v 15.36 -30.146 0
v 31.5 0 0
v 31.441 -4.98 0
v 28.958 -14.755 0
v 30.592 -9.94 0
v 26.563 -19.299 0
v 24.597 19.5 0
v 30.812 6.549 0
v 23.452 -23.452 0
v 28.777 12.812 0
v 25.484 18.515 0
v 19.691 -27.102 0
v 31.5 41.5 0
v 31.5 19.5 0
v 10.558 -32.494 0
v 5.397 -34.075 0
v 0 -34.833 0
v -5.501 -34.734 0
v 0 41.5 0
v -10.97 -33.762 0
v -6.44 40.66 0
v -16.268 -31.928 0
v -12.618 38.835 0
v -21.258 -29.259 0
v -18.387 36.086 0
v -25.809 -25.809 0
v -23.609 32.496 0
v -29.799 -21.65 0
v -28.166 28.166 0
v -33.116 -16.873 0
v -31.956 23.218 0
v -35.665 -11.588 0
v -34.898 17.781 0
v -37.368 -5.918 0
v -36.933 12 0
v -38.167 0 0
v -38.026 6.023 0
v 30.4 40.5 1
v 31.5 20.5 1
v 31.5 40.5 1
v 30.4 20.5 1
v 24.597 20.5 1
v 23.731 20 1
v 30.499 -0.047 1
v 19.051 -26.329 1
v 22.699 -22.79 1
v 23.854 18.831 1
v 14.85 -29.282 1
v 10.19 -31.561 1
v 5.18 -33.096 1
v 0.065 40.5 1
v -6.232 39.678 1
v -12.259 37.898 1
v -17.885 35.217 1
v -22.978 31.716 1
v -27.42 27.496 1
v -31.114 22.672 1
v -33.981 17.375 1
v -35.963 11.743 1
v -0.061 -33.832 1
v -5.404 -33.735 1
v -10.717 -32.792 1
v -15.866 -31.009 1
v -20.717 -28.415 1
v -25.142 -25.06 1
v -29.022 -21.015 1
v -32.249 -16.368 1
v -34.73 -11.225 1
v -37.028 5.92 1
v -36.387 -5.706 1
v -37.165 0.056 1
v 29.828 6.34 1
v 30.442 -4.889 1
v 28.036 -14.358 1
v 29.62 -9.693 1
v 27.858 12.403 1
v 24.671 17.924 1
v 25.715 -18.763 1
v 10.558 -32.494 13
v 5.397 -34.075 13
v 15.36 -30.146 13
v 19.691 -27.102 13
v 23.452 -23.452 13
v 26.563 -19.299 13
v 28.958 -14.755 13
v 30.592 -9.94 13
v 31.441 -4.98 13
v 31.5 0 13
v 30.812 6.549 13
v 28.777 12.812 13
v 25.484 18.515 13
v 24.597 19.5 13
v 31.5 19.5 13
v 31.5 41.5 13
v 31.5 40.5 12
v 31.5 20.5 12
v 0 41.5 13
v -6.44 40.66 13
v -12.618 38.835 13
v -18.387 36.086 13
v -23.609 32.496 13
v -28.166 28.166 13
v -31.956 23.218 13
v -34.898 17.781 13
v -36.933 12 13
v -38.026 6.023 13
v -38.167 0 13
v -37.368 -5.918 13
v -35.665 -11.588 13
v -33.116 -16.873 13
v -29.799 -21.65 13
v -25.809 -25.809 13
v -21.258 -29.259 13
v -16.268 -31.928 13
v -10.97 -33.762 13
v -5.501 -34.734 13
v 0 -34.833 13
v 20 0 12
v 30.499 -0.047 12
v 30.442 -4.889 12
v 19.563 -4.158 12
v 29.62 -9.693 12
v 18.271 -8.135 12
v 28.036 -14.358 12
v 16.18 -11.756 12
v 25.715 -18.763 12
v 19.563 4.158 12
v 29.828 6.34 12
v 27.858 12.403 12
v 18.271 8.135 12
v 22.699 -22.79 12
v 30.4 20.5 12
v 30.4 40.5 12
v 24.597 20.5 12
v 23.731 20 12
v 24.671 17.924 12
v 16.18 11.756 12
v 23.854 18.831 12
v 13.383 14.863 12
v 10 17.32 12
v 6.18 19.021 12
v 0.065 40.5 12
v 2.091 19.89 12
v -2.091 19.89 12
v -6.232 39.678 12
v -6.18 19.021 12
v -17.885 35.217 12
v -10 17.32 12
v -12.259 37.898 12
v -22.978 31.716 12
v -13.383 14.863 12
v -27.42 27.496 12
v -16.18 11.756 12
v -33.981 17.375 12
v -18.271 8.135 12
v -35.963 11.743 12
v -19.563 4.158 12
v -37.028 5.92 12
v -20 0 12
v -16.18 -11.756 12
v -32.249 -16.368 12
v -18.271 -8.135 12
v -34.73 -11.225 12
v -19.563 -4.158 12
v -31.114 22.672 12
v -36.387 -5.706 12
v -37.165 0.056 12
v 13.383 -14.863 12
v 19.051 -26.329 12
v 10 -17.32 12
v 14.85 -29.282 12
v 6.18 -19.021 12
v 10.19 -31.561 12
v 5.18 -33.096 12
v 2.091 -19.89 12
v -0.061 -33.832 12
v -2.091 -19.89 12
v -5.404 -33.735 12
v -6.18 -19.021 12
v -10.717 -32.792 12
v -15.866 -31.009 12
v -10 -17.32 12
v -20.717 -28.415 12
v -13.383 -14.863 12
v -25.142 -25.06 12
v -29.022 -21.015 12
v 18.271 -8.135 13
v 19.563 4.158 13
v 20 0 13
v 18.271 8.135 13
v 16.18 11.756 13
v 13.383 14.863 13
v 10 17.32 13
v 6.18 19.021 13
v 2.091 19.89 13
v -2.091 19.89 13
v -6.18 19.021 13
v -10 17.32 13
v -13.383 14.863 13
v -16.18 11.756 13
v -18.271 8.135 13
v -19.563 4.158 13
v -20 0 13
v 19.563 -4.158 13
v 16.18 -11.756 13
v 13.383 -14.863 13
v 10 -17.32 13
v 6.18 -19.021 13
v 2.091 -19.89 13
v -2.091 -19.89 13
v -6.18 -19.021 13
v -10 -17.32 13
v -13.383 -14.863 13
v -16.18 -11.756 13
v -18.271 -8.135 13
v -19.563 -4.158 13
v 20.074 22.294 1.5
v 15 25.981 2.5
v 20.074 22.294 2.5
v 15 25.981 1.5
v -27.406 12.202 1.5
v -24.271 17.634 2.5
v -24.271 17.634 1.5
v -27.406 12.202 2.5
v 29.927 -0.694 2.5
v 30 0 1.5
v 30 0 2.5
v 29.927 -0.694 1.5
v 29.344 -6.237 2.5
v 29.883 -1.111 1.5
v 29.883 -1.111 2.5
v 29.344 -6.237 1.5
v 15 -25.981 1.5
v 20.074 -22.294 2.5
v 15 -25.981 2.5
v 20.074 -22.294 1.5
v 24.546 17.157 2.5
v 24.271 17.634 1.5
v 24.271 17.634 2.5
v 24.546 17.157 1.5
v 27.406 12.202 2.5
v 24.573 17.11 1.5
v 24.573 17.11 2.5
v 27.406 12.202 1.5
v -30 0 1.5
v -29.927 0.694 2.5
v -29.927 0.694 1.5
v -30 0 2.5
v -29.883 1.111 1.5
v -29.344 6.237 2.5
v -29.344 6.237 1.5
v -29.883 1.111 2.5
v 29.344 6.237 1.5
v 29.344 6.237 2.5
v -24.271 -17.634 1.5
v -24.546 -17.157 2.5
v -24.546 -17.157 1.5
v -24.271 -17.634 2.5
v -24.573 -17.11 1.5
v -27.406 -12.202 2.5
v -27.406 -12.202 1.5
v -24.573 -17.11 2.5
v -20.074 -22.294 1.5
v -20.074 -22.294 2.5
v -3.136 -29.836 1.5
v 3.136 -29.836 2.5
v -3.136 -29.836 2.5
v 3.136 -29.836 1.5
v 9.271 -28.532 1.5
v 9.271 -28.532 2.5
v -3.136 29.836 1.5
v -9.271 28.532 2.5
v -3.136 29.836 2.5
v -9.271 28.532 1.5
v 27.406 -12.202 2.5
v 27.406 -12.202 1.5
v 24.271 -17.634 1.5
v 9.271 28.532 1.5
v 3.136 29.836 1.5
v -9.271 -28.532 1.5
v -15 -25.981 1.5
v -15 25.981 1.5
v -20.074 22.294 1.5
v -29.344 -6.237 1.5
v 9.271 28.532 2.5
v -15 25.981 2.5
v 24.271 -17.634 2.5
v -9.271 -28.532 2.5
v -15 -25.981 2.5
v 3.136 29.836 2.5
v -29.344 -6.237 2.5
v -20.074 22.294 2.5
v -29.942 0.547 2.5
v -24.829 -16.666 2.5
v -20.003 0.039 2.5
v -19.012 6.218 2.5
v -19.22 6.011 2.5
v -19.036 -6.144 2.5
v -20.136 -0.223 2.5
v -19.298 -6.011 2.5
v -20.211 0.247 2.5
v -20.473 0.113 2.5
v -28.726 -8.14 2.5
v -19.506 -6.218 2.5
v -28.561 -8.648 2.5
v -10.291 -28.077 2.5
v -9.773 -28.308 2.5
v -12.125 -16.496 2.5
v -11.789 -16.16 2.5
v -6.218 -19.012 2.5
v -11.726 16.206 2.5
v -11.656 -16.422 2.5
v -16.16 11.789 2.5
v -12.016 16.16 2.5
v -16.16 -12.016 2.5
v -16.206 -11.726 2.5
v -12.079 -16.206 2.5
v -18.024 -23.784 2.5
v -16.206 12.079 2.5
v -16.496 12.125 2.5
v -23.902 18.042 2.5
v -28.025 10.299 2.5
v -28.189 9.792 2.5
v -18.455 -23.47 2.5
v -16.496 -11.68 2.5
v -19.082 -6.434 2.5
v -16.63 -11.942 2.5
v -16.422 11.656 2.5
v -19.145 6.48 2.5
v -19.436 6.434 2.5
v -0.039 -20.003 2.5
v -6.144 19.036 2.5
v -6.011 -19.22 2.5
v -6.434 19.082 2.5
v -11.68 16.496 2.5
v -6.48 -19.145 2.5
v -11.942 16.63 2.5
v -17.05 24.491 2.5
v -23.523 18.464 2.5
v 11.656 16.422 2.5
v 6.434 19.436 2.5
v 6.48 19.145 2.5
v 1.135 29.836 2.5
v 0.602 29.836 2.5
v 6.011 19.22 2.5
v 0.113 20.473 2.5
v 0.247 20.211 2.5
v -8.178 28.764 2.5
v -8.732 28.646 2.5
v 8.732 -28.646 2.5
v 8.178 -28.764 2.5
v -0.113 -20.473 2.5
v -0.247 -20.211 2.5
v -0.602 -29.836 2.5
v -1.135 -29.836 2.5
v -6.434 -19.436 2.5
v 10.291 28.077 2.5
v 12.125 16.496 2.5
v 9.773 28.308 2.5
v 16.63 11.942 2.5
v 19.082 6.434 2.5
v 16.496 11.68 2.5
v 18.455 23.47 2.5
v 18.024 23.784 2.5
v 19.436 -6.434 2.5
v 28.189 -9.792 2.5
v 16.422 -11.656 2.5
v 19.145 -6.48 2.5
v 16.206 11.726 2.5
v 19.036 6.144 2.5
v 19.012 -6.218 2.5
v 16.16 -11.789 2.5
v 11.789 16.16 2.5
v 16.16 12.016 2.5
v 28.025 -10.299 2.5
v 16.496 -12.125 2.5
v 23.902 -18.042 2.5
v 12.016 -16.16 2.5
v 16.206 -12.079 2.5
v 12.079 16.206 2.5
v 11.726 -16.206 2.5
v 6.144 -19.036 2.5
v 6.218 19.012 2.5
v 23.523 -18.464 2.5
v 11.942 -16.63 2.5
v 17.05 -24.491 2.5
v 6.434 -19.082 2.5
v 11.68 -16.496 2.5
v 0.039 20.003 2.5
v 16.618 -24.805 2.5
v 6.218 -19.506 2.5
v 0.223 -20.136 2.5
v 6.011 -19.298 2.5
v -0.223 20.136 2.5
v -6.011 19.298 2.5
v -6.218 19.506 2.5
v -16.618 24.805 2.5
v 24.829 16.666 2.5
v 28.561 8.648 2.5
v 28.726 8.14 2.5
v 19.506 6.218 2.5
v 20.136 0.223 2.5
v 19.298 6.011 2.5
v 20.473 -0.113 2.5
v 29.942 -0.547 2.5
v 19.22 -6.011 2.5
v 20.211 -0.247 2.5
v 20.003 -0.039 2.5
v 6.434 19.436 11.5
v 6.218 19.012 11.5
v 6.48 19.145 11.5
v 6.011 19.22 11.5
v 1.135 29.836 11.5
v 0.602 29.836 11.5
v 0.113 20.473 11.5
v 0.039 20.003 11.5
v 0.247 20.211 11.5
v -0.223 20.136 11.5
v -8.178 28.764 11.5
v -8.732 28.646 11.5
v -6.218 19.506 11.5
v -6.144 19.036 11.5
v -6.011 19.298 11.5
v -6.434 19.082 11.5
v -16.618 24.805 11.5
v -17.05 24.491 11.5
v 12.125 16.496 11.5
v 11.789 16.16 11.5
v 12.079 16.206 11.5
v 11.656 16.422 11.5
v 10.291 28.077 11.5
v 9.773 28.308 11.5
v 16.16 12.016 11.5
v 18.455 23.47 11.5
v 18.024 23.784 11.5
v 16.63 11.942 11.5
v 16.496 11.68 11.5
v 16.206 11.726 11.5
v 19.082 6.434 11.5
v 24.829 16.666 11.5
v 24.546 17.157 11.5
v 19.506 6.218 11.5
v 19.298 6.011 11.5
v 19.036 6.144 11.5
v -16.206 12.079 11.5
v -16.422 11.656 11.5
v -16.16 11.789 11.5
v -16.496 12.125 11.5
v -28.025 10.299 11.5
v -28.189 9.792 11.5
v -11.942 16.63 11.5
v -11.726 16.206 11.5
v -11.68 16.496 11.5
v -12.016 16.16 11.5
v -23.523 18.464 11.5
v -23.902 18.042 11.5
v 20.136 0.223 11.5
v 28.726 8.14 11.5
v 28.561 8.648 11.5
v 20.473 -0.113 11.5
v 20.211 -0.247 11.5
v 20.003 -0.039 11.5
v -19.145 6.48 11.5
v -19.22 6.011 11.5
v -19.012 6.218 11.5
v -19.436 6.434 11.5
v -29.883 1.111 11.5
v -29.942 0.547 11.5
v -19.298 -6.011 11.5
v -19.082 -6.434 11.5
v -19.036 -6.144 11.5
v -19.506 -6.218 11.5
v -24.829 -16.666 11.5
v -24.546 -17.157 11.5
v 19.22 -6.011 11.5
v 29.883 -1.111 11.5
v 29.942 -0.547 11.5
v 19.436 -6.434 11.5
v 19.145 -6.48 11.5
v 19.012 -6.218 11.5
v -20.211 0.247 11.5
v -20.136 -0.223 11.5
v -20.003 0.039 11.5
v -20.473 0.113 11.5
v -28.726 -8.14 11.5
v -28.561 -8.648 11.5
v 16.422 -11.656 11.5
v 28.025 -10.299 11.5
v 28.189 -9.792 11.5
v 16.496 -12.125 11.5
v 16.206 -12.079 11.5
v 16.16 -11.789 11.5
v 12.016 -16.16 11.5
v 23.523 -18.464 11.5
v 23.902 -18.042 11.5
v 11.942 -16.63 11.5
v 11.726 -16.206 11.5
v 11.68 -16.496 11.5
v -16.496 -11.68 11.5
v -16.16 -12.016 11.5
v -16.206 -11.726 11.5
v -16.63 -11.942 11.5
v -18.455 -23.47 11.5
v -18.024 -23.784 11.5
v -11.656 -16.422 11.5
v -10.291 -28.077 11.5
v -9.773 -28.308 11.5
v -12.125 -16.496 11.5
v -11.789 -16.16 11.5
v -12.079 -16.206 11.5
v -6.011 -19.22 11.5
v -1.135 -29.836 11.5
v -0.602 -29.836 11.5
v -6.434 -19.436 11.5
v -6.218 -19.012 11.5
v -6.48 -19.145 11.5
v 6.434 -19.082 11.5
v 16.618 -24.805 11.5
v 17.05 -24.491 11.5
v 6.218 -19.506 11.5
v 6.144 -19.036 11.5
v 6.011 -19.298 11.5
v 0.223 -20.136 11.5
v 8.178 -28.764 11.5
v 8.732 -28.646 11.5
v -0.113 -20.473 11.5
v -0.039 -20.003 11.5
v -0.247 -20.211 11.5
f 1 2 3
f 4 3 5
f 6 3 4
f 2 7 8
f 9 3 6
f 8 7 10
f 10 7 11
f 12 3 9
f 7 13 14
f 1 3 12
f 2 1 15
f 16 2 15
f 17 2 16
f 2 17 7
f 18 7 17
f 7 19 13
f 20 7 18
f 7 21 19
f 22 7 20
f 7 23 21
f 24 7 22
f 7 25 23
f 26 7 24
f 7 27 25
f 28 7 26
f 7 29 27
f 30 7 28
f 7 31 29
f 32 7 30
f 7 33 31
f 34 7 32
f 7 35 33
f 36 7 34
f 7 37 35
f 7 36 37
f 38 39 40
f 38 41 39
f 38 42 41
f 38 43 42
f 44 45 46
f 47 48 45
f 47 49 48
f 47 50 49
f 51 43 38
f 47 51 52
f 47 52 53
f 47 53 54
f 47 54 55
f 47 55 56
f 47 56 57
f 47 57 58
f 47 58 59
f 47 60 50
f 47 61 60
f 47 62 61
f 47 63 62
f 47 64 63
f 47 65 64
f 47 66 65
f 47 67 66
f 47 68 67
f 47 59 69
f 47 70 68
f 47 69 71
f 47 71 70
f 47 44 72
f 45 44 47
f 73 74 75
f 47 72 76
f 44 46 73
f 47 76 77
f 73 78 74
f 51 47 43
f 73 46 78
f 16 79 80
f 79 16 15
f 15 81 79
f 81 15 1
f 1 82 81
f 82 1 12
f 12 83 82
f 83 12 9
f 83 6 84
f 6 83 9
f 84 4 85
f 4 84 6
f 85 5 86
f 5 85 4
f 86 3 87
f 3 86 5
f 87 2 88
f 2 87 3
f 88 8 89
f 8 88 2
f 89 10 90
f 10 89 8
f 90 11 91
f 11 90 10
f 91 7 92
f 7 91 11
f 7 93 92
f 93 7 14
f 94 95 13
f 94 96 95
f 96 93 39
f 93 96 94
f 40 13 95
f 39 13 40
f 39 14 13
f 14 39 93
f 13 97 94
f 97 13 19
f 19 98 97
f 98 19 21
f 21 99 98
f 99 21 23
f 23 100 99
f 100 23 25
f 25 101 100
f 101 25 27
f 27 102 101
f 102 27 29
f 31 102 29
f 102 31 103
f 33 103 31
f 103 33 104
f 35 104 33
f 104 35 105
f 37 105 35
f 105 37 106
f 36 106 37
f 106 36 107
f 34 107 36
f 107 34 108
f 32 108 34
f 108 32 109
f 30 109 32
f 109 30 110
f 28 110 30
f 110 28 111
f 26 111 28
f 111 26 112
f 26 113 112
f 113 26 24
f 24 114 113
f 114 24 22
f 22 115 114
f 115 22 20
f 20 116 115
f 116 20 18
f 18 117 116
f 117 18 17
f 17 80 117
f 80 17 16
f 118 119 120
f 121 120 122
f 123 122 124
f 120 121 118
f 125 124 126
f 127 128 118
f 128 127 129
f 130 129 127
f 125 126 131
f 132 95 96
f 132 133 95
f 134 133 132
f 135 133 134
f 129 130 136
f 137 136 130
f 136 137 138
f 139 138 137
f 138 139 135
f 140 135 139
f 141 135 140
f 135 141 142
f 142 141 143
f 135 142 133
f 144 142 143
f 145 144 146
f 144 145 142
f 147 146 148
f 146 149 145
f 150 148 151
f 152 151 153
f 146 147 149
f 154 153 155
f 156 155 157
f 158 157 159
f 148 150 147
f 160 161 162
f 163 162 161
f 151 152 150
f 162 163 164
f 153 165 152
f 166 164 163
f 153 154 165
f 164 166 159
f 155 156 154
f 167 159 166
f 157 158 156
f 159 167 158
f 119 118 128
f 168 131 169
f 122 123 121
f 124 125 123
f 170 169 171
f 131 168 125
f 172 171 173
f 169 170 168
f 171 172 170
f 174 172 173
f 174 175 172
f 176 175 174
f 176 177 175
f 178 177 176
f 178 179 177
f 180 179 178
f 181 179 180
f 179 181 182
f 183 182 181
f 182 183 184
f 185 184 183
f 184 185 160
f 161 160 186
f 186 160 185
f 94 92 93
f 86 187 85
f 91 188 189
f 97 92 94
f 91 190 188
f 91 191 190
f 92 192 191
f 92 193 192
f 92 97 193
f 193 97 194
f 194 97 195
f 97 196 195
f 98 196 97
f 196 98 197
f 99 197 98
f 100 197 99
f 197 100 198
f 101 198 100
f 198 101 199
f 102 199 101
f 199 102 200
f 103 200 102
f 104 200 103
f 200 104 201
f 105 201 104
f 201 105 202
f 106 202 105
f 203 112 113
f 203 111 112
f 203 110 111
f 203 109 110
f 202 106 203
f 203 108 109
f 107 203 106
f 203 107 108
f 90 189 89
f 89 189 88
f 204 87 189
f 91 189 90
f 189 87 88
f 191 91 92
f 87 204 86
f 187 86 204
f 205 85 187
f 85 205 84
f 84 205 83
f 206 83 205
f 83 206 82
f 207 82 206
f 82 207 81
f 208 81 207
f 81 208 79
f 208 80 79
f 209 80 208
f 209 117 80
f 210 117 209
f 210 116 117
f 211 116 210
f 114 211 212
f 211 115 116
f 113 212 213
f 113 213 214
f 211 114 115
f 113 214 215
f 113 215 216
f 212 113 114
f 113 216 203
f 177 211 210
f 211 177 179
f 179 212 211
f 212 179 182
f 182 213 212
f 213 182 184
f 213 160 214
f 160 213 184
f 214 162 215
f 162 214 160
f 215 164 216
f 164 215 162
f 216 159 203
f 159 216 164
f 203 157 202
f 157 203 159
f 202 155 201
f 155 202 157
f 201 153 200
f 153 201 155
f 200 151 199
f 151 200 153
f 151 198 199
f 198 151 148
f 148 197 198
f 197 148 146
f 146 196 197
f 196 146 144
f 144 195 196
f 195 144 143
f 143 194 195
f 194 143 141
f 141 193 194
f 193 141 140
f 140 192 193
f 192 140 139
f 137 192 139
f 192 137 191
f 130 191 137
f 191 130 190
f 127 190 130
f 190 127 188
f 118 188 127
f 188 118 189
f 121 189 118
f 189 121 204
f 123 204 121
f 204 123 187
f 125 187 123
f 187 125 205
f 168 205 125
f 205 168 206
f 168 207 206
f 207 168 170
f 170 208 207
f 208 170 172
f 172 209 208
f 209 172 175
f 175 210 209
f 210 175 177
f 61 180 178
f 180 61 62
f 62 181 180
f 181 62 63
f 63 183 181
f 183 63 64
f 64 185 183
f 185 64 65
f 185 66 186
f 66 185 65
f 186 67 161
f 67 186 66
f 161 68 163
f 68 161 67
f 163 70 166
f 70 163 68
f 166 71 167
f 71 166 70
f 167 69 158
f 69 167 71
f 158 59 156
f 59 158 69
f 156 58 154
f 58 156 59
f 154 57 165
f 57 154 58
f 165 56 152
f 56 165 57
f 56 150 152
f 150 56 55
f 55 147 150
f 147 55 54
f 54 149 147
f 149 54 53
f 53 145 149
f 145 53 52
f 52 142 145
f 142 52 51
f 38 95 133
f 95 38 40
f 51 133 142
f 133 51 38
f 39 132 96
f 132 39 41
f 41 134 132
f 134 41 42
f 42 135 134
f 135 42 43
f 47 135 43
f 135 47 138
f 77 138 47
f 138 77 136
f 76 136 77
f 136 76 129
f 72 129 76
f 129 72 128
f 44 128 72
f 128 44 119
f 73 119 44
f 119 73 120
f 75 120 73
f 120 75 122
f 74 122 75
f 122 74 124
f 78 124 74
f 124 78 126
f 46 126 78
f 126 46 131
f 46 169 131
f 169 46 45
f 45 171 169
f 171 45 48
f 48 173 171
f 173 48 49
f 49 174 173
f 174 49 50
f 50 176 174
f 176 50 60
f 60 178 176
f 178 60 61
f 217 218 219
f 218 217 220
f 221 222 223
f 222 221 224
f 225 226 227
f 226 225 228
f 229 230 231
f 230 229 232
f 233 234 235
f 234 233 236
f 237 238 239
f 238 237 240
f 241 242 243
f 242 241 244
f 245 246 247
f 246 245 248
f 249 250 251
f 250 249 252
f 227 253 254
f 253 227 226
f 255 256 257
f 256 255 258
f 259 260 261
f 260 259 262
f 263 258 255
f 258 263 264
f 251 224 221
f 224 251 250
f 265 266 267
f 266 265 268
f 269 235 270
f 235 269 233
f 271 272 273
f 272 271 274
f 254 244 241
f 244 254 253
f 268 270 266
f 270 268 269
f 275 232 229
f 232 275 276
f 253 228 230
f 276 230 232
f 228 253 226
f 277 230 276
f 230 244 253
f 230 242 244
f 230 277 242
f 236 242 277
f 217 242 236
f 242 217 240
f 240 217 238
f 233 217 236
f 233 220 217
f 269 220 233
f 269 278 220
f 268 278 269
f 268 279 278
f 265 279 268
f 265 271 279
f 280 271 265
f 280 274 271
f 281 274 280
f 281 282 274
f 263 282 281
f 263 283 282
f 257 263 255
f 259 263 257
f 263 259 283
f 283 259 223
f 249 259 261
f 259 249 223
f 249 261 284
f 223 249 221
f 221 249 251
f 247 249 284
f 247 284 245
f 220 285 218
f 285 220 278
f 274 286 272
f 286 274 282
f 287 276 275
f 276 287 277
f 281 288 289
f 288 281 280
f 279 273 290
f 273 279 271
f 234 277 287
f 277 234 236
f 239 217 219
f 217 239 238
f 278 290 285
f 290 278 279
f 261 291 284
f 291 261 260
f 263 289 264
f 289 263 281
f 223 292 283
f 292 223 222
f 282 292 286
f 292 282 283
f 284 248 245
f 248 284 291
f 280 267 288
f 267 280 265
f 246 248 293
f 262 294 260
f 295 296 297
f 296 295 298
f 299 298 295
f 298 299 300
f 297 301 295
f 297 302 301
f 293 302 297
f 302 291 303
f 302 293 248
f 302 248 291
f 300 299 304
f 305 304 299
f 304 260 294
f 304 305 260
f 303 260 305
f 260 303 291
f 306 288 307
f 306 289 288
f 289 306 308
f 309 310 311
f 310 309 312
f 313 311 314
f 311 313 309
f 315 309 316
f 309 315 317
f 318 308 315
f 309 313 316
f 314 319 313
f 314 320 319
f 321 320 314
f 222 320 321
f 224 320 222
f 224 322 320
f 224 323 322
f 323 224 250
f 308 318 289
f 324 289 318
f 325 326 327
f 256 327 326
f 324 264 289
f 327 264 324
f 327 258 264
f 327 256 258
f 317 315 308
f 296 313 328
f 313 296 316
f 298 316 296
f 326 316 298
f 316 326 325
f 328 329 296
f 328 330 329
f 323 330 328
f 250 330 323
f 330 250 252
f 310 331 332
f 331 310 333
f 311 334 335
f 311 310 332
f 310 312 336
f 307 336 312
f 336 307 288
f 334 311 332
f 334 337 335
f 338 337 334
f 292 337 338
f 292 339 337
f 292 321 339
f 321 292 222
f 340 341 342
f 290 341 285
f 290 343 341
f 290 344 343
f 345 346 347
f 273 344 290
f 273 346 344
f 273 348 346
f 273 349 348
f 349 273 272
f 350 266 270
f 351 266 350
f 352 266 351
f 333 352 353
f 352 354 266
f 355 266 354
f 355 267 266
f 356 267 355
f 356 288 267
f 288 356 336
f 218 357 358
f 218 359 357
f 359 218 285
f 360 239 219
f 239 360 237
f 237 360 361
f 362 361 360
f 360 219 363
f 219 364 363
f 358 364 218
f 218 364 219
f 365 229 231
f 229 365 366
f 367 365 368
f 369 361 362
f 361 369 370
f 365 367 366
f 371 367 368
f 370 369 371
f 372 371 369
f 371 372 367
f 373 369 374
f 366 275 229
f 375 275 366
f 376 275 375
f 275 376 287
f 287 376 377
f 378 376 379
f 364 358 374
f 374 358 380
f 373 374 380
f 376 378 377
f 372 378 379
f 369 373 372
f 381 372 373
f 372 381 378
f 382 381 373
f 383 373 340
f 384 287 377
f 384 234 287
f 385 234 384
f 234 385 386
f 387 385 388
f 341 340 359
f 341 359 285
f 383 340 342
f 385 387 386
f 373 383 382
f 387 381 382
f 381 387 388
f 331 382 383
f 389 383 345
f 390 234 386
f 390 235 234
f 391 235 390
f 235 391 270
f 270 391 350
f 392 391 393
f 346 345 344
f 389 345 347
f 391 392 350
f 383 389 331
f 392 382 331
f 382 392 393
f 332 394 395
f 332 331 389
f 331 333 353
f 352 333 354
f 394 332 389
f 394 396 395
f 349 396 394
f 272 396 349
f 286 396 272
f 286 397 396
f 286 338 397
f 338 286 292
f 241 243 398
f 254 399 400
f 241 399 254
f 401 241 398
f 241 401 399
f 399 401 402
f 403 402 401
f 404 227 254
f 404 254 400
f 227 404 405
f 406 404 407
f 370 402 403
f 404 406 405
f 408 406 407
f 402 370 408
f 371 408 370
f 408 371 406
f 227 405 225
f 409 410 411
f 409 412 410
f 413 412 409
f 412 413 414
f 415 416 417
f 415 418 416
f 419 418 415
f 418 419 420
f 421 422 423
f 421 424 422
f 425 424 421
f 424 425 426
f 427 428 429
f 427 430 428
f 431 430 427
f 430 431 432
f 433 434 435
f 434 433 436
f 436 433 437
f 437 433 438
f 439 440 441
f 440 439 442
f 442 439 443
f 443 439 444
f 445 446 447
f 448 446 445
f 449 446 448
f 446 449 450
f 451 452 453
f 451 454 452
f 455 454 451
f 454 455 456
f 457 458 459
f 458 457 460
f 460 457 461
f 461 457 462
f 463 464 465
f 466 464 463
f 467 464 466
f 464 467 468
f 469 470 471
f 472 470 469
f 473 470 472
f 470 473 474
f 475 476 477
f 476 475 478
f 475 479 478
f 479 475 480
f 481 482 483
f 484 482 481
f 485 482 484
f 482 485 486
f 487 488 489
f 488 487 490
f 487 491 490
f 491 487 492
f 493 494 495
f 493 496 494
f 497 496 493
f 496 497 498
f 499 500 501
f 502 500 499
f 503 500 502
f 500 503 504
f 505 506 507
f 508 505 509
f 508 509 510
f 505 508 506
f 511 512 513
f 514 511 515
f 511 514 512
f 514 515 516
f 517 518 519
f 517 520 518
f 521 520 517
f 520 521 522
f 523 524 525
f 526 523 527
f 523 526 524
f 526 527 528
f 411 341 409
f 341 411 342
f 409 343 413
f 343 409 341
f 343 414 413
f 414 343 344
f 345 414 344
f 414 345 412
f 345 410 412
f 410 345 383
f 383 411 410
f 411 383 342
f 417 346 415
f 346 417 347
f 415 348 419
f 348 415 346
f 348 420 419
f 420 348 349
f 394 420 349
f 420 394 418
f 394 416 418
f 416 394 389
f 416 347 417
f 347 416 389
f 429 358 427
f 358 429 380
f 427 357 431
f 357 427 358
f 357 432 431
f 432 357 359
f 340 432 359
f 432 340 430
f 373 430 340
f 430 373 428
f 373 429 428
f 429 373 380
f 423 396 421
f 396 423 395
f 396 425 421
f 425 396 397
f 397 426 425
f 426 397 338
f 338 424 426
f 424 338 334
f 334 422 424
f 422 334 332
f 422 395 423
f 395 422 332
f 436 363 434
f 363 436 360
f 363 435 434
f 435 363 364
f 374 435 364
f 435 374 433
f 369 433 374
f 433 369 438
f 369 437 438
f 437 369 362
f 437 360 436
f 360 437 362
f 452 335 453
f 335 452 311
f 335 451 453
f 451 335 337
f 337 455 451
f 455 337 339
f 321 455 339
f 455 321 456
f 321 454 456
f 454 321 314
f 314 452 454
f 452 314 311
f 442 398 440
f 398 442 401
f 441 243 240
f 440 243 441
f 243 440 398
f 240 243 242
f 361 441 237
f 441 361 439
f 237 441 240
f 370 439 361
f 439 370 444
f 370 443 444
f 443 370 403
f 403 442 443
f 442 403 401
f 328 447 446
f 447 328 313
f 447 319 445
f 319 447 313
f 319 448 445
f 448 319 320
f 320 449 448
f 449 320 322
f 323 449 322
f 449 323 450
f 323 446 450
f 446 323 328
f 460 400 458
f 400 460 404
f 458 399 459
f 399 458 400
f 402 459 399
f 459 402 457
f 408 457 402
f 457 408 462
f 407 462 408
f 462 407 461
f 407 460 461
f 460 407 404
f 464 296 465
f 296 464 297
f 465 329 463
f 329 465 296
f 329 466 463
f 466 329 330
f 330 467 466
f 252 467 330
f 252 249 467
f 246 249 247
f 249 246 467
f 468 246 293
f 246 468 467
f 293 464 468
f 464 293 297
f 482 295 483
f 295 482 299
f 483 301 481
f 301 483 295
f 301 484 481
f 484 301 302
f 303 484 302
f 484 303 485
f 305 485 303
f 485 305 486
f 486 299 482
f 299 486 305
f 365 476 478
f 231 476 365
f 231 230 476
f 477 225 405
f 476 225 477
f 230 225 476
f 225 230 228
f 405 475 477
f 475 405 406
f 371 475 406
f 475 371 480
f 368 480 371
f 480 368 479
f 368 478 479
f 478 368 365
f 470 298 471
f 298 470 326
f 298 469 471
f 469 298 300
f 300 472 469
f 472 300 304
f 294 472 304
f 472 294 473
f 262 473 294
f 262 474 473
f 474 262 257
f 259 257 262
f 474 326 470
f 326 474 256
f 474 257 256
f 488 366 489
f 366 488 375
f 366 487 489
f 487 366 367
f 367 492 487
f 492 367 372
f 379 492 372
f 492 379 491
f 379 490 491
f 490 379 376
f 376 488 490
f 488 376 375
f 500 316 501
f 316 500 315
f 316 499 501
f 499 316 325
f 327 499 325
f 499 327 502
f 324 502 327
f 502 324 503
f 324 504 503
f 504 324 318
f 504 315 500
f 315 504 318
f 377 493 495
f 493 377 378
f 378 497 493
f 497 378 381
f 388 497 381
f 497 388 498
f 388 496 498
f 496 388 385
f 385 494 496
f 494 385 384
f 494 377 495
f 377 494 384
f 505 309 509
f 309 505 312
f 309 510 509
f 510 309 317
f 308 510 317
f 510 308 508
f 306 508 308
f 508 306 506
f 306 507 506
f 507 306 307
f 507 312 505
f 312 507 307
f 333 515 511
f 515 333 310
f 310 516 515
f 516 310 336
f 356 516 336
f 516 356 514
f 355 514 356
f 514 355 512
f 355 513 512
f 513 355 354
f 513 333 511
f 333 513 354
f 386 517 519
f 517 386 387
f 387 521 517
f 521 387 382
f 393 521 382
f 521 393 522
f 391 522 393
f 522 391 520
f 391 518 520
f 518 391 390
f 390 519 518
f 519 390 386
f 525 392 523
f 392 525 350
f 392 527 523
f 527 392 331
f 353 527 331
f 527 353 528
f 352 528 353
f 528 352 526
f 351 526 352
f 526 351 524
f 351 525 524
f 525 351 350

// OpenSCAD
// file: ../../2D/circle true.scad
// ****************************************************************************
// Circle with edges (instead of vertices) at radius

use <../helpers.scad>;

module circle_true(r, center = true, $fa = $fa, $fn = $fn, $fs = $fs) {
	translate([center ? 0 : r / 2, center ? 0 : r / 2])
	polygon(poly_coords(get_fragments_from_r(r, $fa, $fn, $fs), r));
}
// file: ../../2D/semicircle.scad
/******************************************************************************
 * Semicircle
 */

use <../helpers.scad>;
use <circle true.scad>;

module semicircle(r = 1, $fa = $fa, $fn = $fn, $fs = $fs) {
	difference() {
		circle(r, $fn = get_fragments_from_r(r, $fa, $fn, $fs));

		translate([-r, -r * 2, 0])
		square(r * 2);
	}
}

module semicircle_true(r = 1, $fa = $fa, $fn = $fn, $fs = $fs) {
	difference() {
		circle_true(r, $fa = $fa, $fn = $fn, $fs = $fs);

		translate([-r, -r * 2, 0])
		square(r * 2);
	}
}
// file: ../../constants.scad
/******************************************************************************
 * Helpful constants
 */

// mm per inch
MMPI = 25.4;

// See: https://en.wikipedia.org/wiki/Pi#Approximate_value
PI = 245850922 / 78256779;
// file: ../../2D/segment.scad
// ****************************************************************************
// Segment

use <semicircle.scad>;

module segment(a, r, $fn = $fn) {

	difference() {

		semicircle(r, $fn);

		if (a < 180) {
			rotate([0, 0, a])
			semicircle(r + 1, $fn);
		}
	}

	if (a > 180) {

		rotate([0, 0, 180])
		difference() {

			semicircle(r, $fn);

			rotate([0, 0, a - 180])
			semicircle(r + 1, $fn);
		}
	}
}
// file: ../../helpers.scad
/******************************************************************************
 * HELPERS
 */

include <constants.scad>;

/***
 * Circumference of a circle
 */

function circumference(r) = 2 * PI * r;

/***
 * Clamp a value between two limiting values
 */

function clamp(value, v1, v2) =
	let (_max = max(v1, v2), _min = min(v1, v2))
	min(_max, max(_min, value));

/***
 * Check if vector contains given value
 */

function contains(needle, haystack) = index_of(needle, haystack) >= 0;

/***
 * Determines $fn for given $fa/$fs
 *
 * See: https://en.wikibooks.org/wiki/OpenSCAD_User_Manual/Other_Language_Features#.24fa.2C_.24fs_and_.24fn
 */

function get_fragments_from_r(r, fa = $fa, fn = $fn, fs = $fs) =
// 	(r < GRID_FINE) ? 3 : (
		(fn > 0) ?
			(fn >= 3 ? fn : 3) :
			ceil(max(min(360 / fa, r * 2 * PI / fs), 5))
// 	)
;

/***
 * Gets angle of a helix at given radius and pitch
 */

function helix_angle(r, pitch) = atan(pitch / (PI * 2 * r));

/***
 * Find index of a given value, -1 if not found
 */

function index_of(needle, haystack, _i = 0) =
	_i >= len(haystack) ? -1 : (haystack[_i] == needle ? _i : index_of(needle, haystack, _i + 1));


/***
 * Joins an array into a string
 */

function join(values, sep = ", ", _out = "", _i = 0) =
	_i >= len(values) ? _out :
		join(values, sep, str(_out, values[_i], _i + 1 == len(values) ? "" : sep), _i + 1);

/***
 * Chamfers while extruding a 2D shape
 */

module linear_extrude_chamfer(h, chamfer, round = false, center = true, convexity = 1, $fn = $fn) {

	render(convexity = convexity)
	translate([0, 0, center ? 0 : chamfer])
	minkowski() {

		// extrude
		linear_extrude(h - chamfer * 2, center = center, convexity = convexity)
		offset(r = -chamfer)
		children();

		// this is the chamfer we're interested in
		if (round)
			sphere(chamfer, $fn = $fn);
		else
			for (z = [-1, 1])
				scale([1, 1, z])
				cylinder(h = chamfer, r1 = chamfer, r2 = 0);
	}
}

/***
 * Same as `rotate_extrude`, but with height
 * Note: it's a hack since you can't hull 2D shapes :(
 */

module linear_rotate_extrude(h = 1, a = 360, center = true, convexity = 1, $fn = 0) {

	_steps = round(max(2, $fn != 0 ? $fn : a / 360 * 12));

	translate([0, 0, center ? -h / 2 : 0])
	for (i = [0 : _steps - 1])
	hull()
	for (j = [0, 1])
	translate([0, 0, h / _steps * (i + j)])
	rotate([0, 0, a / _steps * (i + j)])
	rotate([90, 0])
	scale([1, 1, 0.001]) // hack!
	linear_extrude(1)
	children();
}

/***
 * Same as `lookup`, but also works with vectors
 */

function lookup_vector(i, table) =
	let(size = len(table),
		dim = max([ for (i = [0 : size - 1]) len(table[i][1]) ]))
	dim == 1 ? lookup(i, table) :
		[ for(col = [0 : dim - 1])
			let(vals = [ for (i = [0 : size - 1]) [table[i][0], table[i][1][col]] ])
			lookup(i, vals)
		];

/***
 * Offsets points
 */

function offset_point(p, delta = 0) =
	concat([
		p[0] + delta * 2,
		p[1] + delta * 2],
		len(p) > 2 ? p[2] + delta * 2 : []);

/***
 * Sweep a value (for animation)
 */

function oscillate(min = -1, max = 1, t = $t) = (
	(t < 0.5 ?
	t * 2 :
	1 - 2 * (t - 0.5)) * (max - min) + min
);

/***
 * Creates array of polygon coordinates with faces at radius. Used for nuts and
 * critical internal radii. (Low poly `circle` has points at radius, so
 * effective radius is considerably reduced.)
 */

function poly_coords(n, r = 1, mid = true) = [
	for (i = [0 : n - 1]) [
		sin((360 / n / 2) + 360 / n * i),
		cos((360 / n / 2) + 360 / n * i)
	] * (mid ? r / cos(360 / n / 2) : r)
];

/***
 * Point transformations
 */

function rotate_point_x(p, a) =
	let(p2 = len(p) > 2 ? p[2] : 0)
	[p[0],
	p[1] * cos(a) - p2 * sin(a),
	p[1] * sin(a) + p2 * cos(a)];

function rotate_point_y(p, a) =
	let(p2 = len(p) > 2 ? p[2] : 0)
	[p[0] * cos(a) - p2 * sin(a),
	p[1],
	p[0] * sin(a) + p2 * cos(a)];

function rotate_point_z(p, a) =
	concat([
		p[0] * cos(a) - p[1] * sin(a),
		p[0] * sin(a) + p[1] * cos(a)],
		len(p) > 2 ? p[2] : []);

function rotate_point(p, a) =
	let(a2 = len(a) > 2 ? a[2] : 0)
	rotate_point_z(rotate_point_y(rotate_point_x(p, a[0]), a[1]), a2);

function rotate_points(p, a) = [
	for (i = [0 : len(p) - 1])
		rotate_point(p[i], a)
	];

function translate_point(p, t) =
	concat(
		[p[0] + t[0], p[1] + t[1]],
		len(p) > 2 ? p[2] + (len(t) > 2 ? t[2] : 0) : []);

function translate_points(p, t) = [ for (i = [0 : len(p) - 1]) translate_point(p[i], t) ];

/***
 * Sum a vector
 */

function sum(v, _a = 0, _i = 0) =
	_i == len(v) ? _a : sum(v, _a + v[_i], _i + 1);

/***
 * Similar to `reflect` but without mirroring
 */

module transpose(pos = [], x = true, y = true, z = false) {
	for (
		_x = x == true ? [-1, 1] : (x && len(x) > 0 ? x : [1]),
		_y = y == true ? [-1, 1] : (y && len(y) > 0 ? y : [1]),
		_z = z == true ? [-1, 1] : (z && len(z) > 0 ? z : [1]))
		translate([pos[0] * _x, pos[1] * _y, len(pos) > 2 ? pos[2] * _z : 0])
		children();
}

/************************************************************
 * PRINTING
 *
 * expects constants PRINT_LAYER, PRINT_NOZZLE, TOLERANCE_XY and TOLERANCE_Z
 */

// from http://manual.slic3r.org/advanced/flow-math
function printExtrusionWidth(nozzle_dia) = nozzle_dia;// * 1.05; // meh

// clamps height to multiple of layer height
function printHeight(n) = PRINT_LAYER * ceil(n / PRINT_LAYER);

// clamps width to multiple of extrusion width
function printWall(n) = printExtrusionWidth(PRINT_NOZZLE) * ceil(n / printExtrusionWidth(PRINT_NOZZLE));

// adds tolerance (use where fit requires clearance)
function toleranceXY(n = 0) = n + TOLERANCE_XY;
function toleranceZ(n = 0) = n + TOLERANCE_Z;

/***
 * Formatted logging
 */

module error(msg) {
	print(concat(["[ERROR] "], msg));
}

module print(values, sep = "") {
	echo(join(values, sep));
}

module warn(msg) {
	print(concat(["[WARN] "], msg));
}

/***
 * Orient for use in Unity3D
 */

module for_unity3d(scale = 0.001) {
	rotate([-90, 0, 0])
	rotate([0, 0, 90])
	scale(scale)
	children();
}

/***
 * For printing "separate" objects (with 0 separation) with different print settings.
 * Include this in each STL export (one per required settings group).
 */

module print_registration_bounds(bounds = [180, 180], h = 0.2, t = 0.5) {
	linear_extrude(h)
	difference() {
		square([bounds[0], bounds[1]], true);

		offset(r = -t)
		square([bounds[0], bounds[1]], true);
	}
}

/***
 * Mirrors X and Y axes by default (keeps original, unlike `mirror`)
 */

module reflect(x = true, y = true, z = false) {
	for (
		_x = x == true ? [-1, 1] : (x && len(x) > 0 ? x : [1]),
		_y = y == true ? [-1, 1] : (y && len(y) > 0 ? y : [1]),
		_z = z == true ? [-1, 1] : (z && len(z) > 0 ? z : [1]))
		scale([_x, _y, _z])
		children();
}

/***
 * Show half of the thing
 */

module show_half(r = [], t = [], d = 1000, 2d = false) {
	intersection() {
		translate(t)
		rotate(r)
		translate([0, d / 2]) {
			if (2d) {
				square(d, true);
			} else {
				cube(d, true);
			}
		}
		children();
	}
}
// file: ../../2D/arc.scad
/******************************************************************************
 * Arc
 */

use <segment.scad>;

module arc(a, r1, r2, $fn = $fn) {

	r_max = max(r1, r2);
	r_min = min(r1, r2);

	difference() {

		segment(a, r_max, $fn);

		rotate([0, 0, -1])
		segment(a + 2, r_min, $fn);
	}
}
// main file
/******************************************************************************
 * Centrifugal fan (blower)
 */

include <../../2D/arc.scad>;
include <../../helpers.scad>;

module centrifugal_fan(
		blade_angle = -45, // radial = 0
		blade_dim, // [inner dia., outer dia., height]
		blades,
		clearance = 0.5, // between blade and housing
		inlet_rad,
		outlet_width,
		thickness_blade = 0.5,
		thickness_housing = 1,
	) {

	height = blade_dim[2] + (clearance + thickness_housing) * 2;
	_outlet_width = outlet_width != undef ? outlet_width : blade_dim[0];
	r_inlet = inlet_rad != undef ? inlet_rad : blade_dim[0] / 2;
	r_outer_end = blade_dim[0] + clearance + thickness_housing;
	r_outer_start = blade_dim[1] / 2 + clearance + thickness_housing;

	module shape_housing(inlet = false) {

		steps = get_fragments_from_r(r_outer_end);

		difference() {
			union() {
				hull() {
					circle(r_outer_start);

					for (step = [0 : steps])
					rotate([0, 0, 270 / steps * -step])
					translate([r_outer_start - thickness_housing / 2 + (r_outer_end - r_outer_start) * step / steps, 0])
					circle(thickness_housing / 2);
				}

				translate([0, r_outer_end - (_outlet_width + thickness_housing * 2)])
				square([r_outer_start, _outlet_width + thickness_housing * 2]);
			}

			if (inlet)
			circle(r_inlet);
		}
	}

	// bottom/top
	for (z = [0, height - thickness_housing])
	translate([0, 0, z])
	linear_extrude(thickness_housing)
	shape_housing(inlet = !!z);

	// sides
	difference() {
		linear_extrude(height, convexity = 4)
		difference() {
			shape_housing();
			offset(r = -thickness_housing)
			shape_housing();
		}

		// outlet cutout
		translate([r_outer_start - thickness_housing / 2, r_outer_end - _outlet_width / 2 - thickness_housing, height / 2])
		cube([thickness_housing + 0.2, _outlet_width, height - thickness_housing * 2], true);
	}

	// impeller
	translate([0, 0, thickness_housing + clearance])
	centrifugal_impeller(
		blade_angle = blade_angle,
		dim = blade_dim,
		n = blades,
		thickness_blade = thickness_blade,
		thickness_housing = thickness_housing);
}

module centrifugal_impeller(
		dim,
		n,
		blade_angle = 0,
		thickness_blade = 0.5,
		thickness_plate = 1,
	) {

	module shape_blade() {
		hull()
		for (x = [0 : dim[1]])
		translate([x, 0])
		circle(thickness_blade / 2);
	}

	blades = n != undef ? n : get_fragments_from_r(dim[0] / 2) * 2/3;

	// plate
	cylinder(h = thickness_plate, r = dim[1] / 2);

	// blades
	linear_extrude(dim[2])
	intersection() {
		difference() {
			for (a = [0 : 360 / blades : 359])
			rotate([0, 0, a])
			translate([(dim[0] + thickness_blade) / 2, 0])
			rotate([0, 0, -blade_angle])
			shape_blade();

			circle(dim[0] / 2);
		}
		circle(dim[1] / 2);
	}
}

centrifugal_fan(
	blade_dim = [40, 60, 10]
	,outlet_width = 20
);
